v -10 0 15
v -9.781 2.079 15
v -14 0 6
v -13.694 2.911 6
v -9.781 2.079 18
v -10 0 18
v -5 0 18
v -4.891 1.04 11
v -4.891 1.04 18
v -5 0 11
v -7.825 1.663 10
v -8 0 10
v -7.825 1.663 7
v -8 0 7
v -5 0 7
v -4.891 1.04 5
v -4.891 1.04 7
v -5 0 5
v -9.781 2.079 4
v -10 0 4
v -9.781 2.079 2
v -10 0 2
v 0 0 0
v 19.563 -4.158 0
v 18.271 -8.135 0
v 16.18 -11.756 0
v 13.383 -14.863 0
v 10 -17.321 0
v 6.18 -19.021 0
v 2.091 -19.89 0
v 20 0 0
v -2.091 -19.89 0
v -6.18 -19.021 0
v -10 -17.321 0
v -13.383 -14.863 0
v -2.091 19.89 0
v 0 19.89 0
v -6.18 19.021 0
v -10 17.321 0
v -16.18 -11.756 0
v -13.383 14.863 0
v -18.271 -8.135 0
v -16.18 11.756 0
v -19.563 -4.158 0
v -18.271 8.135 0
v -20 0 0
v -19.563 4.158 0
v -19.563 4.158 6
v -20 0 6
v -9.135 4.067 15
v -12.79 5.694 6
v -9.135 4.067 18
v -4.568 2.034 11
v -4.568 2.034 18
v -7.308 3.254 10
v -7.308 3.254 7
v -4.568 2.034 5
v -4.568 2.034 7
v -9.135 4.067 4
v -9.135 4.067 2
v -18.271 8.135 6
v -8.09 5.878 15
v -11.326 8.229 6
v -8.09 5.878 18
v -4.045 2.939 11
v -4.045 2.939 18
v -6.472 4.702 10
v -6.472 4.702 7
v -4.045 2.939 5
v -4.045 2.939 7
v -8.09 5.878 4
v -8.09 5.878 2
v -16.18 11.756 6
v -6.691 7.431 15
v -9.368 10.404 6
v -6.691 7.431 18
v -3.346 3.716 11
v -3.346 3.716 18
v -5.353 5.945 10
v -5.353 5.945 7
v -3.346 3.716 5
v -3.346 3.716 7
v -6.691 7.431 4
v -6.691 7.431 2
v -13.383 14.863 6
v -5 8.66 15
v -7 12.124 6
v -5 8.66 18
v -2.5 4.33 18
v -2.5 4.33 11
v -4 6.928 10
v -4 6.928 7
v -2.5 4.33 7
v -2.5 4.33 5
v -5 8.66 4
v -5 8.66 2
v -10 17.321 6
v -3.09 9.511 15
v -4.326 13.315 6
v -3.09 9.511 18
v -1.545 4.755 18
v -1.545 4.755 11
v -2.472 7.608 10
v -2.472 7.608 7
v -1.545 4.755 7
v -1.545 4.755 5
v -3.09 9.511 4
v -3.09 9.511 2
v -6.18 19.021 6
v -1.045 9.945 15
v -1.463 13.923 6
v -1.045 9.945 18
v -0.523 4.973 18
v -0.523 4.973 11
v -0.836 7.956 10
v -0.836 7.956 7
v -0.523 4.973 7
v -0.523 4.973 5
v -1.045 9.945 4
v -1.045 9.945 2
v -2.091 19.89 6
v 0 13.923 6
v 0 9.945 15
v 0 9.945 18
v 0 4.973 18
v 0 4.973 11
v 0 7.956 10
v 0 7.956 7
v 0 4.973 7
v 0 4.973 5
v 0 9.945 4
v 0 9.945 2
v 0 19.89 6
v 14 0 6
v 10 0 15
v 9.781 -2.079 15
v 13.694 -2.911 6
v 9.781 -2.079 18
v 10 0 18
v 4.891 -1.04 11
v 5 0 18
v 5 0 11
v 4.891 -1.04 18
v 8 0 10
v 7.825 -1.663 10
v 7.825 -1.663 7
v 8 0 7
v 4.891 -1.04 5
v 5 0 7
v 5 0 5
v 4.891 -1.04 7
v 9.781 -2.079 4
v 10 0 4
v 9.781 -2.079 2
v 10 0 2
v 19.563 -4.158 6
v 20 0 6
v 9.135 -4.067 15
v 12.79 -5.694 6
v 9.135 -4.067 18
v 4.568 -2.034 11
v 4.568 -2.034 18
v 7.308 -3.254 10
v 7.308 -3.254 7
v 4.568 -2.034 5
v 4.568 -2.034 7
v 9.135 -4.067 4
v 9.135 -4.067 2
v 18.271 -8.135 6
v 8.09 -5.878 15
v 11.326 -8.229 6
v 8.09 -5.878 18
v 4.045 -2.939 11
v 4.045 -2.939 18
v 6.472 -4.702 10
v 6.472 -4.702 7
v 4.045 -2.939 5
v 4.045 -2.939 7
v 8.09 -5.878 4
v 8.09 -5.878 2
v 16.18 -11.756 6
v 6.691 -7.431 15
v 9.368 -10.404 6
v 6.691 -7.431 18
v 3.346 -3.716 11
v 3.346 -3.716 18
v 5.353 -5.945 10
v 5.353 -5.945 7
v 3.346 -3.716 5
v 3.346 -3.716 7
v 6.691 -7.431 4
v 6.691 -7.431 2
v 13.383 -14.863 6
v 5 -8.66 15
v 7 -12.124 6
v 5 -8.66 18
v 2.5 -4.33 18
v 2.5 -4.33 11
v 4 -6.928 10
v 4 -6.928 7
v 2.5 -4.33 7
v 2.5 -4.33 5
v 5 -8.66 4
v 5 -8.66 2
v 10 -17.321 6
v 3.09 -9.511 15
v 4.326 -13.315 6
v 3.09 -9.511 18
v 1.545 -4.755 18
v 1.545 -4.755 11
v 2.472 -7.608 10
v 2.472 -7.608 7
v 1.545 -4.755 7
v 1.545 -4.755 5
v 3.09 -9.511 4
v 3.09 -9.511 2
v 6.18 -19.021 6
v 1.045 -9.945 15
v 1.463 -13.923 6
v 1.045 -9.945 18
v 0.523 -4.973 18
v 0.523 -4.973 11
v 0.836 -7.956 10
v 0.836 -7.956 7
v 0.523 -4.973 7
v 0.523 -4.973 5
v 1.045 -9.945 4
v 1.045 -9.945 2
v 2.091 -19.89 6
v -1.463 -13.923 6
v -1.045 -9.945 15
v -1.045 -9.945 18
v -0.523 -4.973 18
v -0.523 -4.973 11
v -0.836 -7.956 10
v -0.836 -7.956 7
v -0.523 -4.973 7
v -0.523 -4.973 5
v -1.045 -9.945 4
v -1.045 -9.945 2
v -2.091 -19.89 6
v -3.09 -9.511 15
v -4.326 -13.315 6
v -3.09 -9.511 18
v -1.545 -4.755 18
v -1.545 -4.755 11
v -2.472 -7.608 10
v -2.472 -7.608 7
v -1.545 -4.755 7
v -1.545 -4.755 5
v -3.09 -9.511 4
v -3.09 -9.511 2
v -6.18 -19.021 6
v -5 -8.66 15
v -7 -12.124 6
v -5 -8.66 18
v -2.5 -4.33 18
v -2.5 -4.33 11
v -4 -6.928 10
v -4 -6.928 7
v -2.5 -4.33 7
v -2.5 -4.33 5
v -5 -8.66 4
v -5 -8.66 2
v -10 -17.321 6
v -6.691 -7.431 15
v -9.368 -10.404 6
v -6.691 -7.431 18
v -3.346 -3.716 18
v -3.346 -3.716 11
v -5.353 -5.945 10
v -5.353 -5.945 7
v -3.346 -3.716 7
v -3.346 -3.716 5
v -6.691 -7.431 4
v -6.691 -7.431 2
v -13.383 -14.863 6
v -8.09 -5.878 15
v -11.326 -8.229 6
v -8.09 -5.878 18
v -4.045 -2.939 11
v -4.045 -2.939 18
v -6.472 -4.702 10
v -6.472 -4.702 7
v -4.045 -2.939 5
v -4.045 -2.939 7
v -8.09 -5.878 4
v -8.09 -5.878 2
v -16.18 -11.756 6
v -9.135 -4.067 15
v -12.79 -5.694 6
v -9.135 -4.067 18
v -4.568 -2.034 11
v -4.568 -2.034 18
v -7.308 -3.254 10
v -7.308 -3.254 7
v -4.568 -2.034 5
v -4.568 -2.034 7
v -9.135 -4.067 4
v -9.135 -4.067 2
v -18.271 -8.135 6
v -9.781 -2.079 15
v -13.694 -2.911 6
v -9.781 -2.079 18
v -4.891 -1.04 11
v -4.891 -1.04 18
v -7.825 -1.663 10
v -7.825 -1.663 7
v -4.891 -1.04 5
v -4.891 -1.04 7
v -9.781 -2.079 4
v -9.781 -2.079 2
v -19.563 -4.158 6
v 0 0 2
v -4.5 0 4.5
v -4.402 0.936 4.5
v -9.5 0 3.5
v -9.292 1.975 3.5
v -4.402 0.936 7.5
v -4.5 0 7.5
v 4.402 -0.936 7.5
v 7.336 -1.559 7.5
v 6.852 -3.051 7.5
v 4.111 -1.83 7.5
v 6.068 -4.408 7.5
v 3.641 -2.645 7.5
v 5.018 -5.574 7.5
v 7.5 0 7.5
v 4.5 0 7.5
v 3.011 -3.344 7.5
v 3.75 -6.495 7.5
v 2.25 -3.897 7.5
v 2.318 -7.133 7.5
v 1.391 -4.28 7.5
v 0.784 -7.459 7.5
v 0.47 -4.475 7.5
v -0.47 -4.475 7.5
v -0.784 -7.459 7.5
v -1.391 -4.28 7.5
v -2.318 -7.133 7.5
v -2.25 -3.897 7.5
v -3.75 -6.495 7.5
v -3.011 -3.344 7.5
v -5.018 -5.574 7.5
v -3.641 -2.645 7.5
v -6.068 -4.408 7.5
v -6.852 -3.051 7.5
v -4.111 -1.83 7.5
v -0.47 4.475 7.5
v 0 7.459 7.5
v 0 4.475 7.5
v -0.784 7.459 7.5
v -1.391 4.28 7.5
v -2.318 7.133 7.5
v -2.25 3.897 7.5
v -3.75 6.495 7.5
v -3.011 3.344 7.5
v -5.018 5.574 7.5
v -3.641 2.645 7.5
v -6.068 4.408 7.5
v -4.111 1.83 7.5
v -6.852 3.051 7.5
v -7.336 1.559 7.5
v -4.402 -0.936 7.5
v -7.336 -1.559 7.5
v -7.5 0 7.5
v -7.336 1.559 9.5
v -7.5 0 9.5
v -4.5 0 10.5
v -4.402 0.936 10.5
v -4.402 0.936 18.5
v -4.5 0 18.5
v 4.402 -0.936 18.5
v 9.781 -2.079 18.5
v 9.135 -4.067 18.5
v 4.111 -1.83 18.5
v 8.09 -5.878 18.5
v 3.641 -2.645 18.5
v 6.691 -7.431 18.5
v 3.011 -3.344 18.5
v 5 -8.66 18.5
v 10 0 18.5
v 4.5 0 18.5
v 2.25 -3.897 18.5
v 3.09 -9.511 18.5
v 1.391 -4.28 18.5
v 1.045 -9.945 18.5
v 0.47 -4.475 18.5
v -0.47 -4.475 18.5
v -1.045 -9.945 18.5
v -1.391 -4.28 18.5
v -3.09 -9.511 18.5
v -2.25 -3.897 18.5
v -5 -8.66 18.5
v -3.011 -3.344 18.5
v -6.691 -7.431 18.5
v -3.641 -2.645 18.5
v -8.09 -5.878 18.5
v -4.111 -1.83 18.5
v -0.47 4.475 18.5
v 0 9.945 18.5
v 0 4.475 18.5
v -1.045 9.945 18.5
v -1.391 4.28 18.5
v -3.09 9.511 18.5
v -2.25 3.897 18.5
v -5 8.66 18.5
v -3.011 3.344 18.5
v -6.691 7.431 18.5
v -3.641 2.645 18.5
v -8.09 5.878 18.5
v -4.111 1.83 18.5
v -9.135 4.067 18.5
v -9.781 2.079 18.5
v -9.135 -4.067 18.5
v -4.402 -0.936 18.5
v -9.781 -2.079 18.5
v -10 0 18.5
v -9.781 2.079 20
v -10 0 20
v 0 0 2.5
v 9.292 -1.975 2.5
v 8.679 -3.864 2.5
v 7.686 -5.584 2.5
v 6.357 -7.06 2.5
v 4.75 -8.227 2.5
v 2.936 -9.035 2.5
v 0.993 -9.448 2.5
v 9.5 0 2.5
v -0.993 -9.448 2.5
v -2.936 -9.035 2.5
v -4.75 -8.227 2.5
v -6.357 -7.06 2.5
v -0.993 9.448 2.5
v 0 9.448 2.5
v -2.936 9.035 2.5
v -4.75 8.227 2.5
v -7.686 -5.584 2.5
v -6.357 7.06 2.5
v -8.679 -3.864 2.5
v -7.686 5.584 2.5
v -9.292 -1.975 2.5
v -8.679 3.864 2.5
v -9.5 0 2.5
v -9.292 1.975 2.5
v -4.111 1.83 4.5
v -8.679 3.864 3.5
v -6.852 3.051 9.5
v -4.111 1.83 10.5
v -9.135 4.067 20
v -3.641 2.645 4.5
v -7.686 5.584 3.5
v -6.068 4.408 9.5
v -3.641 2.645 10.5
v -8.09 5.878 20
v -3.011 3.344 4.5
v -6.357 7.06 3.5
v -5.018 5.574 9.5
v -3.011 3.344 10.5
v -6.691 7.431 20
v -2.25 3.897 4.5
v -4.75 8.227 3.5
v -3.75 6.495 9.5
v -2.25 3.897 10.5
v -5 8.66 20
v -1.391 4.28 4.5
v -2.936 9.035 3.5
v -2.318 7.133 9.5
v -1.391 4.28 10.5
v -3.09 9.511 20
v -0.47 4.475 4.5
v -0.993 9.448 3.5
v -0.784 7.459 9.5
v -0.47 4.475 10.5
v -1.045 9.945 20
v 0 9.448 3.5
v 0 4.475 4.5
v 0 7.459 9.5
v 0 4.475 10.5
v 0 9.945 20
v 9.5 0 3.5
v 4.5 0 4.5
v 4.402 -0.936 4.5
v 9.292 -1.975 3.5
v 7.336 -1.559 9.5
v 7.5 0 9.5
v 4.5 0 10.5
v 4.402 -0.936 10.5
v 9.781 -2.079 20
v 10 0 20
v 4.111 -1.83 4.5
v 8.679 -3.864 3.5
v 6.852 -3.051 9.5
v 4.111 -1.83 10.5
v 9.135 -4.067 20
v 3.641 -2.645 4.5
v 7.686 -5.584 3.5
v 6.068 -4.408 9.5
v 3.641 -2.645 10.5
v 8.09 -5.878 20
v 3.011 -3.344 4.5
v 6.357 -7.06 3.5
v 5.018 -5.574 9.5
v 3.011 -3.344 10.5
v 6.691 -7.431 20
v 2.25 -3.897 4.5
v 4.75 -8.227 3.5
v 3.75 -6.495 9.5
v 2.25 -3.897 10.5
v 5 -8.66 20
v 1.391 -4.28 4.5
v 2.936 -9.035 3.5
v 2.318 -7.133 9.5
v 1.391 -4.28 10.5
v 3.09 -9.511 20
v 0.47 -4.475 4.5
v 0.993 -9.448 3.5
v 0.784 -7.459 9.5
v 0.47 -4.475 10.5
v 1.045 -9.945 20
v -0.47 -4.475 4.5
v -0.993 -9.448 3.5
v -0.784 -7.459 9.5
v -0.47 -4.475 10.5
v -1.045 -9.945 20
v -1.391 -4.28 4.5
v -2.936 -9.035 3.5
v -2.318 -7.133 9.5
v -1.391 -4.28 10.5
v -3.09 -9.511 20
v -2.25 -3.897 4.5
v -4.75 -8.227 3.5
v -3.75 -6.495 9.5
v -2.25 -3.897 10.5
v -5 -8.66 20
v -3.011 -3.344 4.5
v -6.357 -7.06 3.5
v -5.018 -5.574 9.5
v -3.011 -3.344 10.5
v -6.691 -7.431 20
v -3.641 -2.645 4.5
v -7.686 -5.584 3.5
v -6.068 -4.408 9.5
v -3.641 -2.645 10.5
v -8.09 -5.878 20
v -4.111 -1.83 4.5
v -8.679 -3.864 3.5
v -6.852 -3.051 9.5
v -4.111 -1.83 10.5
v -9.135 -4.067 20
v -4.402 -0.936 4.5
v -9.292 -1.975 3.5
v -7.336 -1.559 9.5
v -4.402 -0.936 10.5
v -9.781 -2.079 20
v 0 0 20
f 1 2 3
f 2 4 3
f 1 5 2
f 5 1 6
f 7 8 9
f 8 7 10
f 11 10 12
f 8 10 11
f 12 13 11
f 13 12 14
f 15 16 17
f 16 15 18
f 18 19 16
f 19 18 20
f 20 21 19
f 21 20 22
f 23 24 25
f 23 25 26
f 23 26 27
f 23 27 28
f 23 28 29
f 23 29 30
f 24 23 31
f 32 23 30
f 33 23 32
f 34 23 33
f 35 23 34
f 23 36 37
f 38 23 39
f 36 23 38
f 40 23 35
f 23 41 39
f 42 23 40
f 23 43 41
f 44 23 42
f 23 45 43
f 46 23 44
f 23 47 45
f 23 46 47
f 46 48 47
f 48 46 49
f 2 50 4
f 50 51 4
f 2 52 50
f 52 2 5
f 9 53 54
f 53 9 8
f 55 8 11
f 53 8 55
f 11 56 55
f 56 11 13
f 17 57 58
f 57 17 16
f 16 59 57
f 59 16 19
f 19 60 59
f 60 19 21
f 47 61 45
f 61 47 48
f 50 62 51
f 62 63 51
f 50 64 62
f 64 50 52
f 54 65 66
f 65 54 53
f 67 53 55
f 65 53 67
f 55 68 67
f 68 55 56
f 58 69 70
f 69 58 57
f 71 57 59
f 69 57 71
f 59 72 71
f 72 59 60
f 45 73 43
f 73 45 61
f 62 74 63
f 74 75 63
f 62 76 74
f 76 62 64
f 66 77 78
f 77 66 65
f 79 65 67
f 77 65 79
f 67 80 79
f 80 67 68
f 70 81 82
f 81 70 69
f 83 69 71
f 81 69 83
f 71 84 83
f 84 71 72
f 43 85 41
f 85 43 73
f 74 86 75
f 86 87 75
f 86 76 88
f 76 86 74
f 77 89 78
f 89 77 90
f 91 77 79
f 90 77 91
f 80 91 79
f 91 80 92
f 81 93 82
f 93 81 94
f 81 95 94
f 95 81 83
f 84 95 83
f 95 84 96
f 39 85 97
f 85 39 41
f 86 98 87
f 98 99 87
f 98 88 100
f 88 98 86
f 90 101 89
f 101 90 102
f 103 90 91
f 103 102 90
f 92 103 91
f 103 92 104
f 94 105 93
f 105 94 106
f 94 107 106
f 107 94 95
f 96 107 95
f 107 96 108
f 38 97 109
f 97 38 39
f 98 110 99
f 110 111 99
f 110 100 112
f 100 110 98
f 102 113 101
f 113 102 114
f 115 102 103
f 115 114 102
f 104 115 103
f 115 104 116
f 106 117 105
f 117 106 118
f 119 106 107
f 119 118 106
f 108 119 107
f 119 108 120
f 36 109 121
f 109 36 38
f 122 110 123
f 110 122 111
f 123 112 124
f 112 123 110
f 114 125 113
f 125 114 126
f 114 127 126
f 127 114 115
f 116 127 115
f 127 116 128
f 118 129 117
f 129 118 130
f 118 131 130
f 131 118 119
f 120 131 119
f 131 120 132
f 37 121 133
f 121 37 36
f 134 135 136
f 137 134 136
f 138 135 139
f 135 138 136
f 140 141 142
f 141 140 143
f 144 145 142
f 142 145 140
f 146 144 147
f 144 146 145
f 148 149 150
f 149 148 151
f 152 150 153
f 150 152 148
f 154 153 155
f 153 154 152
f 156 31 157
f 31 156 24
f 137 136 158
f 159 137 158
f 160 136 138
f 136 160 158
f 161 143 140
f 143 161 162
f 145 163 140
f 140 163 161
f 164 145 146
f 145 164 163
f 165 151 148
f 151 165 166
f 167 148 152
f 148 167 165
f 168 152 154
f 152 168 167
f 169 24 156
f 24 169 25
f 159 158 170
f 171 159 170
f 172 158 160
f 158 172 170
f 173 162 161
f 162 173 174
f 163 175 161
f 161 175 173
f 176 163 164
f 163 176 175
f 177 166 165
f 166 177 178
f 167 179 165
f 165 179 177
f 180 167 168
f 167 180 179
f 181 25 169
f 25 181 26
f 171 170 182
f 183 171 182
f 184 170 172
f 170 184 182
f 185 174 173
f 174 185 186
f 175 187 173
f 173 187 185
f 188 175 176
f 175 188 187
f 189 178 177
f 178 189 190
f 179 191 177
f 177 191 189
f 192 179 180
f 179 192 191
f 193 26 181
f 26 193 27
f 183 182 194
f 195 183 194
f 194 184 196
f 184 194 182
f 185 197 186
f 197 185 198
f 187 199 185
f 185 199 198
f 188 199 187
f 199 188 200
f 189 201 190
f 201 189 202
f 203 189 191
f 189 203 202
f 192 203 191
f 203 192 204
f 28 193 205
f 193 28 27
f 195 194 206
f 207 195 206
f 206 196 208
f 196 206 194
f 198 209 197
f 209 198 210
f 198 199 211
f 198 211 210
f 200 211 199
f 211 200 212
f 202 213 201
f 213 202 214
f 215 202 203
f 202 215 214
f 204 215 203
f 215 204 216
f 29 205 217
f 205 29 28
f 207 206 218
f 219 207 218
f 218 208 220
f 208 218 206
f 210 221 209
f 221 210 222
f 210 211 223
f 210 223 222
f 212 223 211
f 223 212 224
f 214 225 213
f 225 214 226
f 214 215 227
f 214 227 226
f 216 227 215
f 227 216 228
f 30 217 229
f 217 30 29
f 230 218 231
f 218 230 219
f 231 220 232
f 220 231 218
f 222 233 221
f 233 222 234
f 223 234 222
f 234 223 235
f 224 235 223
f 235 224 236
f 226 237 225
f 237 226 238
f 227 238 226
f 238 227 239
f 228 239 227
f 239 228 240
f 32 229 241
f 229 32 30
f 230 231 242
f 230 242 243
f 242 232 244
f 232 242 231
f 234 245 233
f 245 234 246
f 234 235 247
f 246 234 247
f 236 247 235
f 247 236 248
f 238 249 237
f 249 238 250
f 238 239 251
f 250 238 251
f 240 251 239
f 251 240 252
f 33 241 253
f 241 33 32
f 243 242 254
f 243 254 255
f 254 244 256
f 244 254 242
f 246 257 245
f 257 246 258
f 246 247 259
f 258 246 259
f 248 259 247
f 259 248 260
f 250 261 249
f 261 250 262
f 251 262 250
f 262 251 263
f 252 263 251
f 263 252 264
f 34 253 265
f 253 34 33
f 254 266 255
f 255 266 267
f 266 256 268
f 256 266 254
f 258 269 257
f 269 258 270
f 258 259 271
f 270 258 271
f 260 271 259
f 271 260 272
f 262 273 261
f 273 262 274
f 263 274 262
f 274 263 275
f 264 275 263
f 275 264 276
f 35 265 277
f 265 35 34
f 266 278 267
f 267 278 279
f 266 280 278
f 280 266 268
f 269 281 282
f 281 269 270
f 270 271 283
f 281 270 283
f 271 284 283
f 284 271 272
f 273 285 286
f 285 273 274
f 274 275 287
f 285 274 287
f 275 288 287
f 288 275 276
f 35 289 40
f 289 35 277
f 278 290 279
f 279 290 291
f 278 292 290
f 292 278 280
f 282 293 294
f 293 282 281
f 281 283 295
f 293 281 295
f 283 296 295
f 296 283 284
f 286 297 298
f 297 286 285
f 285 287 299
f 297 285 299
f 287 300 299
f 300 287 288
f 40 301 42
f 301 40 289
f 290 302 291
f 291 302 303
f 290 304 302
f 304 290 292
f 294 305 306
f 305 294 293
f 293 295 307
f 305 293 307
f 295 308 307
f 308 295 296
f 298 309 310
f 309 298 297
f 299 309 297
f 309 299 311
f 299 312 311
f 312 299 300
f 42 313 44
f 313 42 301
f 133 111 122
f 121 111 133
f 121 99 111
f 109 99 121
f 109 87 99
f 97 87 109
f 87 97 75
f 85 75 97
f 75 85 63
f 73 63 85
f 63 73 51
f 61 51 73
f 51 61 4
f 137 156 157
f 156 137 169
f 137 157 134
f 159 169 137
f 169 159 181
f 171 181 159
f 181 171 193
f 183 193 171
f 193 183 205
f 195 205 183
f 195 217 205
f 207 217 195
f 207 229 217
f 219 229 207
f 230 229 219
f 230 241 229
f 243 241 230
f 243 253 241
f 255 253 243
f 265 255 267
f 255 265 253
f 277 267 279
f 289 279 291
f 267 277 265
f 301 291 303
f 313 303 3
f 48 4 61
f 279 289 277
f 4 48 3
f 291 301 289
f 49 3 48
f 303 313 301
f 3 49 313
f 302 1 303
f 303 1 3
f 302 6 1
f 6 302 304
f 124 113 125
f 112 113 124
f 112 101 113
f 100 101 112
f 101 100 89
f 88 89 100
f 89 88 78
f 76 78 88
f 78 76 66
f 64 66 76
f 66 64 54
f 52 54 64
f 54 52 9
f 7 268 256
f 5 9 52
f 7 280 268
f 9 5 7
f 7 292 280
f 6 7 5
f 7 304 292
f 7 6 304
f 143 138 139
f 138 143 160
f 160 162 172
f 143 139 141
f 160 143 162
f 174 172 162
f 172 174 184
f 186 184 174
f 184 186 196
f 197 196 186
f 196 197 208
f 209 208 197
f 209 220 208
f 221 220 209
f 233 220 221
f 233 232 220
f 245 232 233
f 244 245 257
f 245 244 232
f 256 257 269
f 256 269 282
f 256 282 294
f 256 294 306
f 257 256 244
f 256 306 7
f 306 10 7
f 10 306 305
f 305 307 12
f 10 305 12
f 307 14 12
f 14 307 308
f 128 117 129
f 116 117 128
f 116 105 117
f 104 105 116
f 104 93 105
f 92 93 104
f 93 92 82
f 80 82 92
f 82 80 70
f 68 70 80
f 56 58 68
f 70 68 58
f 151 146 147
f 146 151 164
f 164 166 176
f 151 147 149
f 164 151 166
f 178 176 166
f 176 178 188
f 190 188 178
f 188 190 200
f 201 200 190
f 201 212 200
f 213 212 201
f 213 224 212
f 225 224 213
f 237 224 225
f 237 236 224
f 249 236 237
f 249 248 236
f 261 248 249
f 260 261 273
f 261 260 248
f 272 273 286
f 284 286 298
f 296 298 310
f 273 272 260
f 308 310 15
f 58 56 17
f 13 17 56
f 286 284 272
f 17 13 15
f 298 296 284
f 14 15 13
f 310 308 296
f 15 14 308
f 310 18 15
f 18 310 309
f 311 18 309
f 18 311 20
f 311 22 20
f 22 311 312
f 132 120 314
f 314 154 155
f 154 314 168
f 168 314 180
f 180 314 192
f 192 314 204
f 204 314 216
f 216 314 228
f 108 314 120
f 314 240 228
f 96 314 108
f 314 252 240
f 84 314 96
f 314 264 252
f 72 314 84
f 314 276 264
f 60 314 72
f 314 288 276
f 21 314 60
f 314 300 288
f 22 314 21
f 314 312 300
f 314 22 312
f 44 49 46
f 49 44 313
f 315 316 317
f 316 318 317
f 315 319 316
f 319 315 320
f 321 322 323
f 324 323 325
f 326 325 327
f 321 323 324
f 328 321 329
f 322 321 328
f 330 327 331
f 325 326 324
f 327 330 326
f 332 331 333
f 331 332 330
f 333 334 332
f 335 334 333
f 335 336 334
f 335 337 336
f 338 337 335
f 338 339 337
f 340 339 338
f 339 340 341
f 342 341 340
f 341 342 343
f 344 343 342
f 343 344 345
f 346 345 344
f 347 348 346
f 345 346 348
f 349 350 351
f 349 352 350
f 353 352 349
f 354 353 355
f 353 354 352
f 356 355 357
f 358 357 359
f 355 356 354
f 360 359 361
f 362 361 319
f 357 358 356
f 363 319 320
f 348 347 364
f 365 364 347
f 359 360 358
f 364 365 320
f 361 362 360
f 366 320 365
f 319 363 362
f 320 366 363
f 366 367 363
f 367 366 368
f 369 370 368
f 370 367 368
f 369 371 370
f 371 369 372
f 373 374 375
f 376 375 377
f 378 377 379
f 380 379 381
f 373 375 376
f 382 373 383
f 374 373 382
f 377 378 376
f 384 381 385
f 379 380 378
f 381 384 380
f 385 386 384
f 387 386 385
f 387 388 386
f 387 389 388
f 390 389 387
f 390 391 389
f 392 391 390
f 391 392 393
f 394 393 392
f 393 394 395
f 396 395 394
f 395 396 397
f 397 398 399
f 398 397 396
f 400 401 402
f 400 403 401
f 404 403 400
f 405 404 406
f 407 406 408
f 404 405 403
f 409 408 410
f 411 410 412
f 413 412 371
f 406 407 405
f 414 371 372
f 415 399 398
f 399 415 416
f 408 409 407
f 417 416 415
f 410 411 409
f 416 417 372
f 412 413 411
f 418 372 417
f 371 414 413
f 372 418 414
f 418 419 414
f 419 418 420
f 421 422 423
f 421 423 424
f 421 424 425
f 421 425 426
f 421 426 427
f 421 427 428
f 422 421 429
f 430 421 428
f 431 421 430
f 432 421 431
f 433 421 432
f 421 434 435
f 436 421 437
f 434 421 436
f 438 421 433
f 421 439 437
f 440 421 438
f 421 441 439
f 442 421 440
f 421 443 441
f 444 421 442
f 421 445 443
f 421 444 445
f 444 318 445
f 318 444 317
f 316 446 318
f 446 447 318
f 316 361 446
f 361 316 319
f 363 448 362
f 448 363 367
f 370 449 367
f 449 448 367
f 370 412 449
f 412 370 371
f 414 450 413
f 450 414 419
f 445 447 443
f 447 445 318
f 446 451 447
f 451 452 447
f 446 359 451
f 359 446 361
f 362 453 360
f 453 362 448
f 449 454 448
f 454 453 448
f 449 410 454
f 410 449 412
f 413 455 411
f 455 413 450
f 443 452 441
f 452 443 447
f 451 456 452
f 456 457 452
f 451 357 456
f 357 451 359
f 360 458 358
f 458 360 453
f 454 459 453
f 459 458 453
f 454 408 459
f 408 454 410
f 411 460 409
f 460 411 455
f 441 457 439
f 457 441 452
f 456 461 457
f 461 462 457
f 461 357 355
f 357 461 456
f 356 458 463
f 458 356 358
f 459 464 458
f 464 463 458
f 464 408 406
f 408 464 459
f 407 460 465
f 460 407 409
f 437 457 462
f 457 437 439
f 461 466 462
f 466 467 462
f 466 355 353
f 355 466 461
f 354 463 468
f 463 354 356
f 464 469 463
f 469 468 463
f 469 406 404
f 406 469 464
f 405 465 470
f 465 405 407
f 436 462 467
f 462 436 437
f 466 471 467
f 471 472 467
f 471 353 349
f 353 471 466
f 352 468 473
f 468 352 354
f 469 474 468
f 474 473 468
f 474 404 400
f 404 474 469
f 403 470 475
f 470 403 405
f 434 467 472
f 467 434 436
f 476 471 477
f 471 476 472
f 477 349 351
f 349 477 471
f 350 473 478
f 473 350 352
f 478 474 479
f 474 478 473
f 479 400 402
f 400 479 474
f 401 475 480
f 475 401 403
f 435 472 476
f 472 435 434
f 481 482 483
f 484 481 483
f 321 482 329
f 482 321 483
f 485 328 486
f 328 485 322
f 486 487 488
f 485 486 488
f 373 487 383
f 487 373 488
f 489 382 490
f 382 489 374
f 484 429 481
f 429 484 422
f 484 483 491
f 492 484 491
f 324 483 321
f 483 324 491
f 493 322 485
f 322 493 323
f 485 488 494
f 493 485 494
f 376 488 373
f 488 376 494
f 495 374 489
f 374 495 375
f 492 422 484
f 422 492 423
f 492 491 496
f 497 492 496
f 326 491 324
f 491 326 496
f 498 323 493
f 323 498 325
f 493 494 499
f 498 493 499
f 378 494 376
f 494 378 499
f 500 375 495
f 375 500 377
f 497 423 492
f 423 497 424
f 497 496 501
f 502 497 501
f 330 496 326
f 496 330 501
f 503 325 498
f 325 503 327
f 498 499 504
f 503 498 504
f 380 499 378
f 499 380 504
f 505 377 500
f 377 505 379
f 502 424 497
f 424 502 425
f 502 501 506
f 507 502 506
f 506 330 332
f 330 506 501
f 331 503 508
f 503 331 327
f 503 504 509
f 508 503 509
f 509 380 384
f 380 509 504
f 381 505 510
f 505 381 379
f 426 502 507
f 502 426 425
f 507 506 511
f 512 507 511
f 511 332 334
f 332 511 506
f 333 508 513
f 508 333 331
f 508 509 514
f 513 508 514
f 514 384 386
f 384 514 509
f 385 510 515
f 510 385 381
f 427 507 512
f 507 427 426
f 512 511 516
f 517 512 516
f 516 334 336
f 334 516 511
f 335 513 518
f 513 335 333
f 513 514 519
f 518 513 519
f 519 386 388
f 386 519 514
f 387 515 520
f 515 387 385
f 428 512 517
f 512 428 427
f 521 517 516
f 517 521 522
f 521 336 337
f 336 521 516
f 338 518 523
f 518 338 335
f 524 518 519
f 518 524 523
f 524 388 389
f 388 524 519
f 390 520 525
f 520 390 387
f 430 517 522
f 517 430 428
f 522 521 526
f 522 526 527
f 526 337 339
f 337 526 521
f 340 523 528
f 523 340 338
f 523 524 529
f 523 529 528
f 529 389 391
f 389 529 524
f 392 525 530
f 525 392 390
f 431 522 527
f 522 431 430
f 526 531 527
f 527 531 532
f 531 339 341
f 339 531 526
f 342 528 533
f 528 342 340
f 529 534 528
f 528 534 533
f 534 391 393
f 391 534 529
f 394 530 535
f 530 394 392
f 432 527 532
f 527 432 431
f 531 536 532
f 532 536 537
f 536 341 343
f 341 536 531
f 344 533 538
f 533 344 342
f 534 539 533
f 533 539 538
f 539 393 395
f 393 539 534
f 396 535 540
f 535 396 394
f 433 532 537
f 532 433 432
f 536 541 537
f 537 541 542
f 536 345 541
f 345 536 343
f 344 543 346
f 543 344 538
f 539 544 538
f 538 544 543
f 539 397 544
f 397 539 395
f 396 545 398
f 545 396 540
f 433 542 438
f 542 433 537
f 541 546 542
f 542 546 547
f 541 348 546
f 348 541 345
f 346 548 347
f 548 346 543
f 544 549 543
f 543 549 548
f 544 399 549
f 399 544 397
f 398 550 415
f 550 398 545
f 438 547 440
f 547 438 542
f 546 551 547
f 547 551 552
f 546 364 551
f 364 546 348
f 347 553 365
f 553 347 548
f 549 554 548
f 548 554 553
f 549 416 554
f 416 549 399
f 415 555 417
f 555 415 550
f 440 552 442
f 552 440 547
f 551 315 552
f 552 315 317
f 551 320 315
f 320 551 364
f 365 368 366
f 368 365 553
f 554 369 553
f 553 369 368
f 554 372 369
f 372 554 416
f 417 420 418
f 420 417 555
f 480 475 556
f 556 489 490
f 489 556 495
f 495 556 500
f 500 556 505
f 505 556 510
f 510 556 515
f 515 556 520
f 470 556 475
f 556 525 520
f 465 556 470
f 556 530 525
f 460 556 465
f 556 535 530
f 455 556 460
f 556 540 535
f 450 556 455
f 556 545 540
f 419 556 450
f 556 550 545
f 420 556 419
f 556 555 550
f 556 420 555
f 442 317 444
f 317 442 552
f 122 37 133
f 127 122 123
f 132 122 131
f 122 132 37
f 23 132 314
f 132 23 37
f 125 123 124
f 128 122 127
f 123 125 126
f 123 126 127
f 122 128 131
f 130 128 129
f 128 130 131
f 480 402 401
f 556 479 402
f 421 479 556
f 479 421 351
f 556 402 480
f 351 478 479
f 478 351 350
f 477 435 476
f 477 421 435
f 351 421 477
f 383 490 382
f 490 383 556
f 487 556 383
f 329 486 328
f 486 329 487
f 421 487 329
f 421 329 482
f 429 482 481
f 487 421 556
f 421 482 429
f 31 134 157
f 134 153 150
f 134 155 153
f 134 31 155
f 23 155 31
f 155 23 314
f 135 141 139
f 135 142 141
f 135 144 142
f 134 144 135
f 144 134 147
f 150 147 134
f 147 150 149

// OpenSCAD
gap = 0.5;
height=18; //30
width=20; //25
difference(){
foot();
    translate([0,0,0])
    cube([25,25,50]);
}


module foot(){
rotate_extrude(angle = 360, convexity = 10){
  polygon(points=[[0,0],[width,0],[width,6],[14
  ,6], [10,15], [10,height], [5,height], [5,11],[8,10],[8,7],[5,7], [5,5], [10,4],[10,2], [0,2]]);
}
rotate_extrude(angle = 360, convexity = 10){
  polygon(points=[[0,2+gap],[10-gap,2+gap], [10-gap, 4-gap], [5-gap,5-gap], [5-gap,7+gap], [8-gap,7+gap], [8-gap, 10-gap], [5-gap,11-gap], [5-gap,height+gap], [10,height+gap],[10,height+2], [0,height+2]]);
}
}

//currently: base diameter 36mm
//diameter stem 10mm
//max estension hook: 25mm
//diameter hook: 6mm
//height base 6mm
